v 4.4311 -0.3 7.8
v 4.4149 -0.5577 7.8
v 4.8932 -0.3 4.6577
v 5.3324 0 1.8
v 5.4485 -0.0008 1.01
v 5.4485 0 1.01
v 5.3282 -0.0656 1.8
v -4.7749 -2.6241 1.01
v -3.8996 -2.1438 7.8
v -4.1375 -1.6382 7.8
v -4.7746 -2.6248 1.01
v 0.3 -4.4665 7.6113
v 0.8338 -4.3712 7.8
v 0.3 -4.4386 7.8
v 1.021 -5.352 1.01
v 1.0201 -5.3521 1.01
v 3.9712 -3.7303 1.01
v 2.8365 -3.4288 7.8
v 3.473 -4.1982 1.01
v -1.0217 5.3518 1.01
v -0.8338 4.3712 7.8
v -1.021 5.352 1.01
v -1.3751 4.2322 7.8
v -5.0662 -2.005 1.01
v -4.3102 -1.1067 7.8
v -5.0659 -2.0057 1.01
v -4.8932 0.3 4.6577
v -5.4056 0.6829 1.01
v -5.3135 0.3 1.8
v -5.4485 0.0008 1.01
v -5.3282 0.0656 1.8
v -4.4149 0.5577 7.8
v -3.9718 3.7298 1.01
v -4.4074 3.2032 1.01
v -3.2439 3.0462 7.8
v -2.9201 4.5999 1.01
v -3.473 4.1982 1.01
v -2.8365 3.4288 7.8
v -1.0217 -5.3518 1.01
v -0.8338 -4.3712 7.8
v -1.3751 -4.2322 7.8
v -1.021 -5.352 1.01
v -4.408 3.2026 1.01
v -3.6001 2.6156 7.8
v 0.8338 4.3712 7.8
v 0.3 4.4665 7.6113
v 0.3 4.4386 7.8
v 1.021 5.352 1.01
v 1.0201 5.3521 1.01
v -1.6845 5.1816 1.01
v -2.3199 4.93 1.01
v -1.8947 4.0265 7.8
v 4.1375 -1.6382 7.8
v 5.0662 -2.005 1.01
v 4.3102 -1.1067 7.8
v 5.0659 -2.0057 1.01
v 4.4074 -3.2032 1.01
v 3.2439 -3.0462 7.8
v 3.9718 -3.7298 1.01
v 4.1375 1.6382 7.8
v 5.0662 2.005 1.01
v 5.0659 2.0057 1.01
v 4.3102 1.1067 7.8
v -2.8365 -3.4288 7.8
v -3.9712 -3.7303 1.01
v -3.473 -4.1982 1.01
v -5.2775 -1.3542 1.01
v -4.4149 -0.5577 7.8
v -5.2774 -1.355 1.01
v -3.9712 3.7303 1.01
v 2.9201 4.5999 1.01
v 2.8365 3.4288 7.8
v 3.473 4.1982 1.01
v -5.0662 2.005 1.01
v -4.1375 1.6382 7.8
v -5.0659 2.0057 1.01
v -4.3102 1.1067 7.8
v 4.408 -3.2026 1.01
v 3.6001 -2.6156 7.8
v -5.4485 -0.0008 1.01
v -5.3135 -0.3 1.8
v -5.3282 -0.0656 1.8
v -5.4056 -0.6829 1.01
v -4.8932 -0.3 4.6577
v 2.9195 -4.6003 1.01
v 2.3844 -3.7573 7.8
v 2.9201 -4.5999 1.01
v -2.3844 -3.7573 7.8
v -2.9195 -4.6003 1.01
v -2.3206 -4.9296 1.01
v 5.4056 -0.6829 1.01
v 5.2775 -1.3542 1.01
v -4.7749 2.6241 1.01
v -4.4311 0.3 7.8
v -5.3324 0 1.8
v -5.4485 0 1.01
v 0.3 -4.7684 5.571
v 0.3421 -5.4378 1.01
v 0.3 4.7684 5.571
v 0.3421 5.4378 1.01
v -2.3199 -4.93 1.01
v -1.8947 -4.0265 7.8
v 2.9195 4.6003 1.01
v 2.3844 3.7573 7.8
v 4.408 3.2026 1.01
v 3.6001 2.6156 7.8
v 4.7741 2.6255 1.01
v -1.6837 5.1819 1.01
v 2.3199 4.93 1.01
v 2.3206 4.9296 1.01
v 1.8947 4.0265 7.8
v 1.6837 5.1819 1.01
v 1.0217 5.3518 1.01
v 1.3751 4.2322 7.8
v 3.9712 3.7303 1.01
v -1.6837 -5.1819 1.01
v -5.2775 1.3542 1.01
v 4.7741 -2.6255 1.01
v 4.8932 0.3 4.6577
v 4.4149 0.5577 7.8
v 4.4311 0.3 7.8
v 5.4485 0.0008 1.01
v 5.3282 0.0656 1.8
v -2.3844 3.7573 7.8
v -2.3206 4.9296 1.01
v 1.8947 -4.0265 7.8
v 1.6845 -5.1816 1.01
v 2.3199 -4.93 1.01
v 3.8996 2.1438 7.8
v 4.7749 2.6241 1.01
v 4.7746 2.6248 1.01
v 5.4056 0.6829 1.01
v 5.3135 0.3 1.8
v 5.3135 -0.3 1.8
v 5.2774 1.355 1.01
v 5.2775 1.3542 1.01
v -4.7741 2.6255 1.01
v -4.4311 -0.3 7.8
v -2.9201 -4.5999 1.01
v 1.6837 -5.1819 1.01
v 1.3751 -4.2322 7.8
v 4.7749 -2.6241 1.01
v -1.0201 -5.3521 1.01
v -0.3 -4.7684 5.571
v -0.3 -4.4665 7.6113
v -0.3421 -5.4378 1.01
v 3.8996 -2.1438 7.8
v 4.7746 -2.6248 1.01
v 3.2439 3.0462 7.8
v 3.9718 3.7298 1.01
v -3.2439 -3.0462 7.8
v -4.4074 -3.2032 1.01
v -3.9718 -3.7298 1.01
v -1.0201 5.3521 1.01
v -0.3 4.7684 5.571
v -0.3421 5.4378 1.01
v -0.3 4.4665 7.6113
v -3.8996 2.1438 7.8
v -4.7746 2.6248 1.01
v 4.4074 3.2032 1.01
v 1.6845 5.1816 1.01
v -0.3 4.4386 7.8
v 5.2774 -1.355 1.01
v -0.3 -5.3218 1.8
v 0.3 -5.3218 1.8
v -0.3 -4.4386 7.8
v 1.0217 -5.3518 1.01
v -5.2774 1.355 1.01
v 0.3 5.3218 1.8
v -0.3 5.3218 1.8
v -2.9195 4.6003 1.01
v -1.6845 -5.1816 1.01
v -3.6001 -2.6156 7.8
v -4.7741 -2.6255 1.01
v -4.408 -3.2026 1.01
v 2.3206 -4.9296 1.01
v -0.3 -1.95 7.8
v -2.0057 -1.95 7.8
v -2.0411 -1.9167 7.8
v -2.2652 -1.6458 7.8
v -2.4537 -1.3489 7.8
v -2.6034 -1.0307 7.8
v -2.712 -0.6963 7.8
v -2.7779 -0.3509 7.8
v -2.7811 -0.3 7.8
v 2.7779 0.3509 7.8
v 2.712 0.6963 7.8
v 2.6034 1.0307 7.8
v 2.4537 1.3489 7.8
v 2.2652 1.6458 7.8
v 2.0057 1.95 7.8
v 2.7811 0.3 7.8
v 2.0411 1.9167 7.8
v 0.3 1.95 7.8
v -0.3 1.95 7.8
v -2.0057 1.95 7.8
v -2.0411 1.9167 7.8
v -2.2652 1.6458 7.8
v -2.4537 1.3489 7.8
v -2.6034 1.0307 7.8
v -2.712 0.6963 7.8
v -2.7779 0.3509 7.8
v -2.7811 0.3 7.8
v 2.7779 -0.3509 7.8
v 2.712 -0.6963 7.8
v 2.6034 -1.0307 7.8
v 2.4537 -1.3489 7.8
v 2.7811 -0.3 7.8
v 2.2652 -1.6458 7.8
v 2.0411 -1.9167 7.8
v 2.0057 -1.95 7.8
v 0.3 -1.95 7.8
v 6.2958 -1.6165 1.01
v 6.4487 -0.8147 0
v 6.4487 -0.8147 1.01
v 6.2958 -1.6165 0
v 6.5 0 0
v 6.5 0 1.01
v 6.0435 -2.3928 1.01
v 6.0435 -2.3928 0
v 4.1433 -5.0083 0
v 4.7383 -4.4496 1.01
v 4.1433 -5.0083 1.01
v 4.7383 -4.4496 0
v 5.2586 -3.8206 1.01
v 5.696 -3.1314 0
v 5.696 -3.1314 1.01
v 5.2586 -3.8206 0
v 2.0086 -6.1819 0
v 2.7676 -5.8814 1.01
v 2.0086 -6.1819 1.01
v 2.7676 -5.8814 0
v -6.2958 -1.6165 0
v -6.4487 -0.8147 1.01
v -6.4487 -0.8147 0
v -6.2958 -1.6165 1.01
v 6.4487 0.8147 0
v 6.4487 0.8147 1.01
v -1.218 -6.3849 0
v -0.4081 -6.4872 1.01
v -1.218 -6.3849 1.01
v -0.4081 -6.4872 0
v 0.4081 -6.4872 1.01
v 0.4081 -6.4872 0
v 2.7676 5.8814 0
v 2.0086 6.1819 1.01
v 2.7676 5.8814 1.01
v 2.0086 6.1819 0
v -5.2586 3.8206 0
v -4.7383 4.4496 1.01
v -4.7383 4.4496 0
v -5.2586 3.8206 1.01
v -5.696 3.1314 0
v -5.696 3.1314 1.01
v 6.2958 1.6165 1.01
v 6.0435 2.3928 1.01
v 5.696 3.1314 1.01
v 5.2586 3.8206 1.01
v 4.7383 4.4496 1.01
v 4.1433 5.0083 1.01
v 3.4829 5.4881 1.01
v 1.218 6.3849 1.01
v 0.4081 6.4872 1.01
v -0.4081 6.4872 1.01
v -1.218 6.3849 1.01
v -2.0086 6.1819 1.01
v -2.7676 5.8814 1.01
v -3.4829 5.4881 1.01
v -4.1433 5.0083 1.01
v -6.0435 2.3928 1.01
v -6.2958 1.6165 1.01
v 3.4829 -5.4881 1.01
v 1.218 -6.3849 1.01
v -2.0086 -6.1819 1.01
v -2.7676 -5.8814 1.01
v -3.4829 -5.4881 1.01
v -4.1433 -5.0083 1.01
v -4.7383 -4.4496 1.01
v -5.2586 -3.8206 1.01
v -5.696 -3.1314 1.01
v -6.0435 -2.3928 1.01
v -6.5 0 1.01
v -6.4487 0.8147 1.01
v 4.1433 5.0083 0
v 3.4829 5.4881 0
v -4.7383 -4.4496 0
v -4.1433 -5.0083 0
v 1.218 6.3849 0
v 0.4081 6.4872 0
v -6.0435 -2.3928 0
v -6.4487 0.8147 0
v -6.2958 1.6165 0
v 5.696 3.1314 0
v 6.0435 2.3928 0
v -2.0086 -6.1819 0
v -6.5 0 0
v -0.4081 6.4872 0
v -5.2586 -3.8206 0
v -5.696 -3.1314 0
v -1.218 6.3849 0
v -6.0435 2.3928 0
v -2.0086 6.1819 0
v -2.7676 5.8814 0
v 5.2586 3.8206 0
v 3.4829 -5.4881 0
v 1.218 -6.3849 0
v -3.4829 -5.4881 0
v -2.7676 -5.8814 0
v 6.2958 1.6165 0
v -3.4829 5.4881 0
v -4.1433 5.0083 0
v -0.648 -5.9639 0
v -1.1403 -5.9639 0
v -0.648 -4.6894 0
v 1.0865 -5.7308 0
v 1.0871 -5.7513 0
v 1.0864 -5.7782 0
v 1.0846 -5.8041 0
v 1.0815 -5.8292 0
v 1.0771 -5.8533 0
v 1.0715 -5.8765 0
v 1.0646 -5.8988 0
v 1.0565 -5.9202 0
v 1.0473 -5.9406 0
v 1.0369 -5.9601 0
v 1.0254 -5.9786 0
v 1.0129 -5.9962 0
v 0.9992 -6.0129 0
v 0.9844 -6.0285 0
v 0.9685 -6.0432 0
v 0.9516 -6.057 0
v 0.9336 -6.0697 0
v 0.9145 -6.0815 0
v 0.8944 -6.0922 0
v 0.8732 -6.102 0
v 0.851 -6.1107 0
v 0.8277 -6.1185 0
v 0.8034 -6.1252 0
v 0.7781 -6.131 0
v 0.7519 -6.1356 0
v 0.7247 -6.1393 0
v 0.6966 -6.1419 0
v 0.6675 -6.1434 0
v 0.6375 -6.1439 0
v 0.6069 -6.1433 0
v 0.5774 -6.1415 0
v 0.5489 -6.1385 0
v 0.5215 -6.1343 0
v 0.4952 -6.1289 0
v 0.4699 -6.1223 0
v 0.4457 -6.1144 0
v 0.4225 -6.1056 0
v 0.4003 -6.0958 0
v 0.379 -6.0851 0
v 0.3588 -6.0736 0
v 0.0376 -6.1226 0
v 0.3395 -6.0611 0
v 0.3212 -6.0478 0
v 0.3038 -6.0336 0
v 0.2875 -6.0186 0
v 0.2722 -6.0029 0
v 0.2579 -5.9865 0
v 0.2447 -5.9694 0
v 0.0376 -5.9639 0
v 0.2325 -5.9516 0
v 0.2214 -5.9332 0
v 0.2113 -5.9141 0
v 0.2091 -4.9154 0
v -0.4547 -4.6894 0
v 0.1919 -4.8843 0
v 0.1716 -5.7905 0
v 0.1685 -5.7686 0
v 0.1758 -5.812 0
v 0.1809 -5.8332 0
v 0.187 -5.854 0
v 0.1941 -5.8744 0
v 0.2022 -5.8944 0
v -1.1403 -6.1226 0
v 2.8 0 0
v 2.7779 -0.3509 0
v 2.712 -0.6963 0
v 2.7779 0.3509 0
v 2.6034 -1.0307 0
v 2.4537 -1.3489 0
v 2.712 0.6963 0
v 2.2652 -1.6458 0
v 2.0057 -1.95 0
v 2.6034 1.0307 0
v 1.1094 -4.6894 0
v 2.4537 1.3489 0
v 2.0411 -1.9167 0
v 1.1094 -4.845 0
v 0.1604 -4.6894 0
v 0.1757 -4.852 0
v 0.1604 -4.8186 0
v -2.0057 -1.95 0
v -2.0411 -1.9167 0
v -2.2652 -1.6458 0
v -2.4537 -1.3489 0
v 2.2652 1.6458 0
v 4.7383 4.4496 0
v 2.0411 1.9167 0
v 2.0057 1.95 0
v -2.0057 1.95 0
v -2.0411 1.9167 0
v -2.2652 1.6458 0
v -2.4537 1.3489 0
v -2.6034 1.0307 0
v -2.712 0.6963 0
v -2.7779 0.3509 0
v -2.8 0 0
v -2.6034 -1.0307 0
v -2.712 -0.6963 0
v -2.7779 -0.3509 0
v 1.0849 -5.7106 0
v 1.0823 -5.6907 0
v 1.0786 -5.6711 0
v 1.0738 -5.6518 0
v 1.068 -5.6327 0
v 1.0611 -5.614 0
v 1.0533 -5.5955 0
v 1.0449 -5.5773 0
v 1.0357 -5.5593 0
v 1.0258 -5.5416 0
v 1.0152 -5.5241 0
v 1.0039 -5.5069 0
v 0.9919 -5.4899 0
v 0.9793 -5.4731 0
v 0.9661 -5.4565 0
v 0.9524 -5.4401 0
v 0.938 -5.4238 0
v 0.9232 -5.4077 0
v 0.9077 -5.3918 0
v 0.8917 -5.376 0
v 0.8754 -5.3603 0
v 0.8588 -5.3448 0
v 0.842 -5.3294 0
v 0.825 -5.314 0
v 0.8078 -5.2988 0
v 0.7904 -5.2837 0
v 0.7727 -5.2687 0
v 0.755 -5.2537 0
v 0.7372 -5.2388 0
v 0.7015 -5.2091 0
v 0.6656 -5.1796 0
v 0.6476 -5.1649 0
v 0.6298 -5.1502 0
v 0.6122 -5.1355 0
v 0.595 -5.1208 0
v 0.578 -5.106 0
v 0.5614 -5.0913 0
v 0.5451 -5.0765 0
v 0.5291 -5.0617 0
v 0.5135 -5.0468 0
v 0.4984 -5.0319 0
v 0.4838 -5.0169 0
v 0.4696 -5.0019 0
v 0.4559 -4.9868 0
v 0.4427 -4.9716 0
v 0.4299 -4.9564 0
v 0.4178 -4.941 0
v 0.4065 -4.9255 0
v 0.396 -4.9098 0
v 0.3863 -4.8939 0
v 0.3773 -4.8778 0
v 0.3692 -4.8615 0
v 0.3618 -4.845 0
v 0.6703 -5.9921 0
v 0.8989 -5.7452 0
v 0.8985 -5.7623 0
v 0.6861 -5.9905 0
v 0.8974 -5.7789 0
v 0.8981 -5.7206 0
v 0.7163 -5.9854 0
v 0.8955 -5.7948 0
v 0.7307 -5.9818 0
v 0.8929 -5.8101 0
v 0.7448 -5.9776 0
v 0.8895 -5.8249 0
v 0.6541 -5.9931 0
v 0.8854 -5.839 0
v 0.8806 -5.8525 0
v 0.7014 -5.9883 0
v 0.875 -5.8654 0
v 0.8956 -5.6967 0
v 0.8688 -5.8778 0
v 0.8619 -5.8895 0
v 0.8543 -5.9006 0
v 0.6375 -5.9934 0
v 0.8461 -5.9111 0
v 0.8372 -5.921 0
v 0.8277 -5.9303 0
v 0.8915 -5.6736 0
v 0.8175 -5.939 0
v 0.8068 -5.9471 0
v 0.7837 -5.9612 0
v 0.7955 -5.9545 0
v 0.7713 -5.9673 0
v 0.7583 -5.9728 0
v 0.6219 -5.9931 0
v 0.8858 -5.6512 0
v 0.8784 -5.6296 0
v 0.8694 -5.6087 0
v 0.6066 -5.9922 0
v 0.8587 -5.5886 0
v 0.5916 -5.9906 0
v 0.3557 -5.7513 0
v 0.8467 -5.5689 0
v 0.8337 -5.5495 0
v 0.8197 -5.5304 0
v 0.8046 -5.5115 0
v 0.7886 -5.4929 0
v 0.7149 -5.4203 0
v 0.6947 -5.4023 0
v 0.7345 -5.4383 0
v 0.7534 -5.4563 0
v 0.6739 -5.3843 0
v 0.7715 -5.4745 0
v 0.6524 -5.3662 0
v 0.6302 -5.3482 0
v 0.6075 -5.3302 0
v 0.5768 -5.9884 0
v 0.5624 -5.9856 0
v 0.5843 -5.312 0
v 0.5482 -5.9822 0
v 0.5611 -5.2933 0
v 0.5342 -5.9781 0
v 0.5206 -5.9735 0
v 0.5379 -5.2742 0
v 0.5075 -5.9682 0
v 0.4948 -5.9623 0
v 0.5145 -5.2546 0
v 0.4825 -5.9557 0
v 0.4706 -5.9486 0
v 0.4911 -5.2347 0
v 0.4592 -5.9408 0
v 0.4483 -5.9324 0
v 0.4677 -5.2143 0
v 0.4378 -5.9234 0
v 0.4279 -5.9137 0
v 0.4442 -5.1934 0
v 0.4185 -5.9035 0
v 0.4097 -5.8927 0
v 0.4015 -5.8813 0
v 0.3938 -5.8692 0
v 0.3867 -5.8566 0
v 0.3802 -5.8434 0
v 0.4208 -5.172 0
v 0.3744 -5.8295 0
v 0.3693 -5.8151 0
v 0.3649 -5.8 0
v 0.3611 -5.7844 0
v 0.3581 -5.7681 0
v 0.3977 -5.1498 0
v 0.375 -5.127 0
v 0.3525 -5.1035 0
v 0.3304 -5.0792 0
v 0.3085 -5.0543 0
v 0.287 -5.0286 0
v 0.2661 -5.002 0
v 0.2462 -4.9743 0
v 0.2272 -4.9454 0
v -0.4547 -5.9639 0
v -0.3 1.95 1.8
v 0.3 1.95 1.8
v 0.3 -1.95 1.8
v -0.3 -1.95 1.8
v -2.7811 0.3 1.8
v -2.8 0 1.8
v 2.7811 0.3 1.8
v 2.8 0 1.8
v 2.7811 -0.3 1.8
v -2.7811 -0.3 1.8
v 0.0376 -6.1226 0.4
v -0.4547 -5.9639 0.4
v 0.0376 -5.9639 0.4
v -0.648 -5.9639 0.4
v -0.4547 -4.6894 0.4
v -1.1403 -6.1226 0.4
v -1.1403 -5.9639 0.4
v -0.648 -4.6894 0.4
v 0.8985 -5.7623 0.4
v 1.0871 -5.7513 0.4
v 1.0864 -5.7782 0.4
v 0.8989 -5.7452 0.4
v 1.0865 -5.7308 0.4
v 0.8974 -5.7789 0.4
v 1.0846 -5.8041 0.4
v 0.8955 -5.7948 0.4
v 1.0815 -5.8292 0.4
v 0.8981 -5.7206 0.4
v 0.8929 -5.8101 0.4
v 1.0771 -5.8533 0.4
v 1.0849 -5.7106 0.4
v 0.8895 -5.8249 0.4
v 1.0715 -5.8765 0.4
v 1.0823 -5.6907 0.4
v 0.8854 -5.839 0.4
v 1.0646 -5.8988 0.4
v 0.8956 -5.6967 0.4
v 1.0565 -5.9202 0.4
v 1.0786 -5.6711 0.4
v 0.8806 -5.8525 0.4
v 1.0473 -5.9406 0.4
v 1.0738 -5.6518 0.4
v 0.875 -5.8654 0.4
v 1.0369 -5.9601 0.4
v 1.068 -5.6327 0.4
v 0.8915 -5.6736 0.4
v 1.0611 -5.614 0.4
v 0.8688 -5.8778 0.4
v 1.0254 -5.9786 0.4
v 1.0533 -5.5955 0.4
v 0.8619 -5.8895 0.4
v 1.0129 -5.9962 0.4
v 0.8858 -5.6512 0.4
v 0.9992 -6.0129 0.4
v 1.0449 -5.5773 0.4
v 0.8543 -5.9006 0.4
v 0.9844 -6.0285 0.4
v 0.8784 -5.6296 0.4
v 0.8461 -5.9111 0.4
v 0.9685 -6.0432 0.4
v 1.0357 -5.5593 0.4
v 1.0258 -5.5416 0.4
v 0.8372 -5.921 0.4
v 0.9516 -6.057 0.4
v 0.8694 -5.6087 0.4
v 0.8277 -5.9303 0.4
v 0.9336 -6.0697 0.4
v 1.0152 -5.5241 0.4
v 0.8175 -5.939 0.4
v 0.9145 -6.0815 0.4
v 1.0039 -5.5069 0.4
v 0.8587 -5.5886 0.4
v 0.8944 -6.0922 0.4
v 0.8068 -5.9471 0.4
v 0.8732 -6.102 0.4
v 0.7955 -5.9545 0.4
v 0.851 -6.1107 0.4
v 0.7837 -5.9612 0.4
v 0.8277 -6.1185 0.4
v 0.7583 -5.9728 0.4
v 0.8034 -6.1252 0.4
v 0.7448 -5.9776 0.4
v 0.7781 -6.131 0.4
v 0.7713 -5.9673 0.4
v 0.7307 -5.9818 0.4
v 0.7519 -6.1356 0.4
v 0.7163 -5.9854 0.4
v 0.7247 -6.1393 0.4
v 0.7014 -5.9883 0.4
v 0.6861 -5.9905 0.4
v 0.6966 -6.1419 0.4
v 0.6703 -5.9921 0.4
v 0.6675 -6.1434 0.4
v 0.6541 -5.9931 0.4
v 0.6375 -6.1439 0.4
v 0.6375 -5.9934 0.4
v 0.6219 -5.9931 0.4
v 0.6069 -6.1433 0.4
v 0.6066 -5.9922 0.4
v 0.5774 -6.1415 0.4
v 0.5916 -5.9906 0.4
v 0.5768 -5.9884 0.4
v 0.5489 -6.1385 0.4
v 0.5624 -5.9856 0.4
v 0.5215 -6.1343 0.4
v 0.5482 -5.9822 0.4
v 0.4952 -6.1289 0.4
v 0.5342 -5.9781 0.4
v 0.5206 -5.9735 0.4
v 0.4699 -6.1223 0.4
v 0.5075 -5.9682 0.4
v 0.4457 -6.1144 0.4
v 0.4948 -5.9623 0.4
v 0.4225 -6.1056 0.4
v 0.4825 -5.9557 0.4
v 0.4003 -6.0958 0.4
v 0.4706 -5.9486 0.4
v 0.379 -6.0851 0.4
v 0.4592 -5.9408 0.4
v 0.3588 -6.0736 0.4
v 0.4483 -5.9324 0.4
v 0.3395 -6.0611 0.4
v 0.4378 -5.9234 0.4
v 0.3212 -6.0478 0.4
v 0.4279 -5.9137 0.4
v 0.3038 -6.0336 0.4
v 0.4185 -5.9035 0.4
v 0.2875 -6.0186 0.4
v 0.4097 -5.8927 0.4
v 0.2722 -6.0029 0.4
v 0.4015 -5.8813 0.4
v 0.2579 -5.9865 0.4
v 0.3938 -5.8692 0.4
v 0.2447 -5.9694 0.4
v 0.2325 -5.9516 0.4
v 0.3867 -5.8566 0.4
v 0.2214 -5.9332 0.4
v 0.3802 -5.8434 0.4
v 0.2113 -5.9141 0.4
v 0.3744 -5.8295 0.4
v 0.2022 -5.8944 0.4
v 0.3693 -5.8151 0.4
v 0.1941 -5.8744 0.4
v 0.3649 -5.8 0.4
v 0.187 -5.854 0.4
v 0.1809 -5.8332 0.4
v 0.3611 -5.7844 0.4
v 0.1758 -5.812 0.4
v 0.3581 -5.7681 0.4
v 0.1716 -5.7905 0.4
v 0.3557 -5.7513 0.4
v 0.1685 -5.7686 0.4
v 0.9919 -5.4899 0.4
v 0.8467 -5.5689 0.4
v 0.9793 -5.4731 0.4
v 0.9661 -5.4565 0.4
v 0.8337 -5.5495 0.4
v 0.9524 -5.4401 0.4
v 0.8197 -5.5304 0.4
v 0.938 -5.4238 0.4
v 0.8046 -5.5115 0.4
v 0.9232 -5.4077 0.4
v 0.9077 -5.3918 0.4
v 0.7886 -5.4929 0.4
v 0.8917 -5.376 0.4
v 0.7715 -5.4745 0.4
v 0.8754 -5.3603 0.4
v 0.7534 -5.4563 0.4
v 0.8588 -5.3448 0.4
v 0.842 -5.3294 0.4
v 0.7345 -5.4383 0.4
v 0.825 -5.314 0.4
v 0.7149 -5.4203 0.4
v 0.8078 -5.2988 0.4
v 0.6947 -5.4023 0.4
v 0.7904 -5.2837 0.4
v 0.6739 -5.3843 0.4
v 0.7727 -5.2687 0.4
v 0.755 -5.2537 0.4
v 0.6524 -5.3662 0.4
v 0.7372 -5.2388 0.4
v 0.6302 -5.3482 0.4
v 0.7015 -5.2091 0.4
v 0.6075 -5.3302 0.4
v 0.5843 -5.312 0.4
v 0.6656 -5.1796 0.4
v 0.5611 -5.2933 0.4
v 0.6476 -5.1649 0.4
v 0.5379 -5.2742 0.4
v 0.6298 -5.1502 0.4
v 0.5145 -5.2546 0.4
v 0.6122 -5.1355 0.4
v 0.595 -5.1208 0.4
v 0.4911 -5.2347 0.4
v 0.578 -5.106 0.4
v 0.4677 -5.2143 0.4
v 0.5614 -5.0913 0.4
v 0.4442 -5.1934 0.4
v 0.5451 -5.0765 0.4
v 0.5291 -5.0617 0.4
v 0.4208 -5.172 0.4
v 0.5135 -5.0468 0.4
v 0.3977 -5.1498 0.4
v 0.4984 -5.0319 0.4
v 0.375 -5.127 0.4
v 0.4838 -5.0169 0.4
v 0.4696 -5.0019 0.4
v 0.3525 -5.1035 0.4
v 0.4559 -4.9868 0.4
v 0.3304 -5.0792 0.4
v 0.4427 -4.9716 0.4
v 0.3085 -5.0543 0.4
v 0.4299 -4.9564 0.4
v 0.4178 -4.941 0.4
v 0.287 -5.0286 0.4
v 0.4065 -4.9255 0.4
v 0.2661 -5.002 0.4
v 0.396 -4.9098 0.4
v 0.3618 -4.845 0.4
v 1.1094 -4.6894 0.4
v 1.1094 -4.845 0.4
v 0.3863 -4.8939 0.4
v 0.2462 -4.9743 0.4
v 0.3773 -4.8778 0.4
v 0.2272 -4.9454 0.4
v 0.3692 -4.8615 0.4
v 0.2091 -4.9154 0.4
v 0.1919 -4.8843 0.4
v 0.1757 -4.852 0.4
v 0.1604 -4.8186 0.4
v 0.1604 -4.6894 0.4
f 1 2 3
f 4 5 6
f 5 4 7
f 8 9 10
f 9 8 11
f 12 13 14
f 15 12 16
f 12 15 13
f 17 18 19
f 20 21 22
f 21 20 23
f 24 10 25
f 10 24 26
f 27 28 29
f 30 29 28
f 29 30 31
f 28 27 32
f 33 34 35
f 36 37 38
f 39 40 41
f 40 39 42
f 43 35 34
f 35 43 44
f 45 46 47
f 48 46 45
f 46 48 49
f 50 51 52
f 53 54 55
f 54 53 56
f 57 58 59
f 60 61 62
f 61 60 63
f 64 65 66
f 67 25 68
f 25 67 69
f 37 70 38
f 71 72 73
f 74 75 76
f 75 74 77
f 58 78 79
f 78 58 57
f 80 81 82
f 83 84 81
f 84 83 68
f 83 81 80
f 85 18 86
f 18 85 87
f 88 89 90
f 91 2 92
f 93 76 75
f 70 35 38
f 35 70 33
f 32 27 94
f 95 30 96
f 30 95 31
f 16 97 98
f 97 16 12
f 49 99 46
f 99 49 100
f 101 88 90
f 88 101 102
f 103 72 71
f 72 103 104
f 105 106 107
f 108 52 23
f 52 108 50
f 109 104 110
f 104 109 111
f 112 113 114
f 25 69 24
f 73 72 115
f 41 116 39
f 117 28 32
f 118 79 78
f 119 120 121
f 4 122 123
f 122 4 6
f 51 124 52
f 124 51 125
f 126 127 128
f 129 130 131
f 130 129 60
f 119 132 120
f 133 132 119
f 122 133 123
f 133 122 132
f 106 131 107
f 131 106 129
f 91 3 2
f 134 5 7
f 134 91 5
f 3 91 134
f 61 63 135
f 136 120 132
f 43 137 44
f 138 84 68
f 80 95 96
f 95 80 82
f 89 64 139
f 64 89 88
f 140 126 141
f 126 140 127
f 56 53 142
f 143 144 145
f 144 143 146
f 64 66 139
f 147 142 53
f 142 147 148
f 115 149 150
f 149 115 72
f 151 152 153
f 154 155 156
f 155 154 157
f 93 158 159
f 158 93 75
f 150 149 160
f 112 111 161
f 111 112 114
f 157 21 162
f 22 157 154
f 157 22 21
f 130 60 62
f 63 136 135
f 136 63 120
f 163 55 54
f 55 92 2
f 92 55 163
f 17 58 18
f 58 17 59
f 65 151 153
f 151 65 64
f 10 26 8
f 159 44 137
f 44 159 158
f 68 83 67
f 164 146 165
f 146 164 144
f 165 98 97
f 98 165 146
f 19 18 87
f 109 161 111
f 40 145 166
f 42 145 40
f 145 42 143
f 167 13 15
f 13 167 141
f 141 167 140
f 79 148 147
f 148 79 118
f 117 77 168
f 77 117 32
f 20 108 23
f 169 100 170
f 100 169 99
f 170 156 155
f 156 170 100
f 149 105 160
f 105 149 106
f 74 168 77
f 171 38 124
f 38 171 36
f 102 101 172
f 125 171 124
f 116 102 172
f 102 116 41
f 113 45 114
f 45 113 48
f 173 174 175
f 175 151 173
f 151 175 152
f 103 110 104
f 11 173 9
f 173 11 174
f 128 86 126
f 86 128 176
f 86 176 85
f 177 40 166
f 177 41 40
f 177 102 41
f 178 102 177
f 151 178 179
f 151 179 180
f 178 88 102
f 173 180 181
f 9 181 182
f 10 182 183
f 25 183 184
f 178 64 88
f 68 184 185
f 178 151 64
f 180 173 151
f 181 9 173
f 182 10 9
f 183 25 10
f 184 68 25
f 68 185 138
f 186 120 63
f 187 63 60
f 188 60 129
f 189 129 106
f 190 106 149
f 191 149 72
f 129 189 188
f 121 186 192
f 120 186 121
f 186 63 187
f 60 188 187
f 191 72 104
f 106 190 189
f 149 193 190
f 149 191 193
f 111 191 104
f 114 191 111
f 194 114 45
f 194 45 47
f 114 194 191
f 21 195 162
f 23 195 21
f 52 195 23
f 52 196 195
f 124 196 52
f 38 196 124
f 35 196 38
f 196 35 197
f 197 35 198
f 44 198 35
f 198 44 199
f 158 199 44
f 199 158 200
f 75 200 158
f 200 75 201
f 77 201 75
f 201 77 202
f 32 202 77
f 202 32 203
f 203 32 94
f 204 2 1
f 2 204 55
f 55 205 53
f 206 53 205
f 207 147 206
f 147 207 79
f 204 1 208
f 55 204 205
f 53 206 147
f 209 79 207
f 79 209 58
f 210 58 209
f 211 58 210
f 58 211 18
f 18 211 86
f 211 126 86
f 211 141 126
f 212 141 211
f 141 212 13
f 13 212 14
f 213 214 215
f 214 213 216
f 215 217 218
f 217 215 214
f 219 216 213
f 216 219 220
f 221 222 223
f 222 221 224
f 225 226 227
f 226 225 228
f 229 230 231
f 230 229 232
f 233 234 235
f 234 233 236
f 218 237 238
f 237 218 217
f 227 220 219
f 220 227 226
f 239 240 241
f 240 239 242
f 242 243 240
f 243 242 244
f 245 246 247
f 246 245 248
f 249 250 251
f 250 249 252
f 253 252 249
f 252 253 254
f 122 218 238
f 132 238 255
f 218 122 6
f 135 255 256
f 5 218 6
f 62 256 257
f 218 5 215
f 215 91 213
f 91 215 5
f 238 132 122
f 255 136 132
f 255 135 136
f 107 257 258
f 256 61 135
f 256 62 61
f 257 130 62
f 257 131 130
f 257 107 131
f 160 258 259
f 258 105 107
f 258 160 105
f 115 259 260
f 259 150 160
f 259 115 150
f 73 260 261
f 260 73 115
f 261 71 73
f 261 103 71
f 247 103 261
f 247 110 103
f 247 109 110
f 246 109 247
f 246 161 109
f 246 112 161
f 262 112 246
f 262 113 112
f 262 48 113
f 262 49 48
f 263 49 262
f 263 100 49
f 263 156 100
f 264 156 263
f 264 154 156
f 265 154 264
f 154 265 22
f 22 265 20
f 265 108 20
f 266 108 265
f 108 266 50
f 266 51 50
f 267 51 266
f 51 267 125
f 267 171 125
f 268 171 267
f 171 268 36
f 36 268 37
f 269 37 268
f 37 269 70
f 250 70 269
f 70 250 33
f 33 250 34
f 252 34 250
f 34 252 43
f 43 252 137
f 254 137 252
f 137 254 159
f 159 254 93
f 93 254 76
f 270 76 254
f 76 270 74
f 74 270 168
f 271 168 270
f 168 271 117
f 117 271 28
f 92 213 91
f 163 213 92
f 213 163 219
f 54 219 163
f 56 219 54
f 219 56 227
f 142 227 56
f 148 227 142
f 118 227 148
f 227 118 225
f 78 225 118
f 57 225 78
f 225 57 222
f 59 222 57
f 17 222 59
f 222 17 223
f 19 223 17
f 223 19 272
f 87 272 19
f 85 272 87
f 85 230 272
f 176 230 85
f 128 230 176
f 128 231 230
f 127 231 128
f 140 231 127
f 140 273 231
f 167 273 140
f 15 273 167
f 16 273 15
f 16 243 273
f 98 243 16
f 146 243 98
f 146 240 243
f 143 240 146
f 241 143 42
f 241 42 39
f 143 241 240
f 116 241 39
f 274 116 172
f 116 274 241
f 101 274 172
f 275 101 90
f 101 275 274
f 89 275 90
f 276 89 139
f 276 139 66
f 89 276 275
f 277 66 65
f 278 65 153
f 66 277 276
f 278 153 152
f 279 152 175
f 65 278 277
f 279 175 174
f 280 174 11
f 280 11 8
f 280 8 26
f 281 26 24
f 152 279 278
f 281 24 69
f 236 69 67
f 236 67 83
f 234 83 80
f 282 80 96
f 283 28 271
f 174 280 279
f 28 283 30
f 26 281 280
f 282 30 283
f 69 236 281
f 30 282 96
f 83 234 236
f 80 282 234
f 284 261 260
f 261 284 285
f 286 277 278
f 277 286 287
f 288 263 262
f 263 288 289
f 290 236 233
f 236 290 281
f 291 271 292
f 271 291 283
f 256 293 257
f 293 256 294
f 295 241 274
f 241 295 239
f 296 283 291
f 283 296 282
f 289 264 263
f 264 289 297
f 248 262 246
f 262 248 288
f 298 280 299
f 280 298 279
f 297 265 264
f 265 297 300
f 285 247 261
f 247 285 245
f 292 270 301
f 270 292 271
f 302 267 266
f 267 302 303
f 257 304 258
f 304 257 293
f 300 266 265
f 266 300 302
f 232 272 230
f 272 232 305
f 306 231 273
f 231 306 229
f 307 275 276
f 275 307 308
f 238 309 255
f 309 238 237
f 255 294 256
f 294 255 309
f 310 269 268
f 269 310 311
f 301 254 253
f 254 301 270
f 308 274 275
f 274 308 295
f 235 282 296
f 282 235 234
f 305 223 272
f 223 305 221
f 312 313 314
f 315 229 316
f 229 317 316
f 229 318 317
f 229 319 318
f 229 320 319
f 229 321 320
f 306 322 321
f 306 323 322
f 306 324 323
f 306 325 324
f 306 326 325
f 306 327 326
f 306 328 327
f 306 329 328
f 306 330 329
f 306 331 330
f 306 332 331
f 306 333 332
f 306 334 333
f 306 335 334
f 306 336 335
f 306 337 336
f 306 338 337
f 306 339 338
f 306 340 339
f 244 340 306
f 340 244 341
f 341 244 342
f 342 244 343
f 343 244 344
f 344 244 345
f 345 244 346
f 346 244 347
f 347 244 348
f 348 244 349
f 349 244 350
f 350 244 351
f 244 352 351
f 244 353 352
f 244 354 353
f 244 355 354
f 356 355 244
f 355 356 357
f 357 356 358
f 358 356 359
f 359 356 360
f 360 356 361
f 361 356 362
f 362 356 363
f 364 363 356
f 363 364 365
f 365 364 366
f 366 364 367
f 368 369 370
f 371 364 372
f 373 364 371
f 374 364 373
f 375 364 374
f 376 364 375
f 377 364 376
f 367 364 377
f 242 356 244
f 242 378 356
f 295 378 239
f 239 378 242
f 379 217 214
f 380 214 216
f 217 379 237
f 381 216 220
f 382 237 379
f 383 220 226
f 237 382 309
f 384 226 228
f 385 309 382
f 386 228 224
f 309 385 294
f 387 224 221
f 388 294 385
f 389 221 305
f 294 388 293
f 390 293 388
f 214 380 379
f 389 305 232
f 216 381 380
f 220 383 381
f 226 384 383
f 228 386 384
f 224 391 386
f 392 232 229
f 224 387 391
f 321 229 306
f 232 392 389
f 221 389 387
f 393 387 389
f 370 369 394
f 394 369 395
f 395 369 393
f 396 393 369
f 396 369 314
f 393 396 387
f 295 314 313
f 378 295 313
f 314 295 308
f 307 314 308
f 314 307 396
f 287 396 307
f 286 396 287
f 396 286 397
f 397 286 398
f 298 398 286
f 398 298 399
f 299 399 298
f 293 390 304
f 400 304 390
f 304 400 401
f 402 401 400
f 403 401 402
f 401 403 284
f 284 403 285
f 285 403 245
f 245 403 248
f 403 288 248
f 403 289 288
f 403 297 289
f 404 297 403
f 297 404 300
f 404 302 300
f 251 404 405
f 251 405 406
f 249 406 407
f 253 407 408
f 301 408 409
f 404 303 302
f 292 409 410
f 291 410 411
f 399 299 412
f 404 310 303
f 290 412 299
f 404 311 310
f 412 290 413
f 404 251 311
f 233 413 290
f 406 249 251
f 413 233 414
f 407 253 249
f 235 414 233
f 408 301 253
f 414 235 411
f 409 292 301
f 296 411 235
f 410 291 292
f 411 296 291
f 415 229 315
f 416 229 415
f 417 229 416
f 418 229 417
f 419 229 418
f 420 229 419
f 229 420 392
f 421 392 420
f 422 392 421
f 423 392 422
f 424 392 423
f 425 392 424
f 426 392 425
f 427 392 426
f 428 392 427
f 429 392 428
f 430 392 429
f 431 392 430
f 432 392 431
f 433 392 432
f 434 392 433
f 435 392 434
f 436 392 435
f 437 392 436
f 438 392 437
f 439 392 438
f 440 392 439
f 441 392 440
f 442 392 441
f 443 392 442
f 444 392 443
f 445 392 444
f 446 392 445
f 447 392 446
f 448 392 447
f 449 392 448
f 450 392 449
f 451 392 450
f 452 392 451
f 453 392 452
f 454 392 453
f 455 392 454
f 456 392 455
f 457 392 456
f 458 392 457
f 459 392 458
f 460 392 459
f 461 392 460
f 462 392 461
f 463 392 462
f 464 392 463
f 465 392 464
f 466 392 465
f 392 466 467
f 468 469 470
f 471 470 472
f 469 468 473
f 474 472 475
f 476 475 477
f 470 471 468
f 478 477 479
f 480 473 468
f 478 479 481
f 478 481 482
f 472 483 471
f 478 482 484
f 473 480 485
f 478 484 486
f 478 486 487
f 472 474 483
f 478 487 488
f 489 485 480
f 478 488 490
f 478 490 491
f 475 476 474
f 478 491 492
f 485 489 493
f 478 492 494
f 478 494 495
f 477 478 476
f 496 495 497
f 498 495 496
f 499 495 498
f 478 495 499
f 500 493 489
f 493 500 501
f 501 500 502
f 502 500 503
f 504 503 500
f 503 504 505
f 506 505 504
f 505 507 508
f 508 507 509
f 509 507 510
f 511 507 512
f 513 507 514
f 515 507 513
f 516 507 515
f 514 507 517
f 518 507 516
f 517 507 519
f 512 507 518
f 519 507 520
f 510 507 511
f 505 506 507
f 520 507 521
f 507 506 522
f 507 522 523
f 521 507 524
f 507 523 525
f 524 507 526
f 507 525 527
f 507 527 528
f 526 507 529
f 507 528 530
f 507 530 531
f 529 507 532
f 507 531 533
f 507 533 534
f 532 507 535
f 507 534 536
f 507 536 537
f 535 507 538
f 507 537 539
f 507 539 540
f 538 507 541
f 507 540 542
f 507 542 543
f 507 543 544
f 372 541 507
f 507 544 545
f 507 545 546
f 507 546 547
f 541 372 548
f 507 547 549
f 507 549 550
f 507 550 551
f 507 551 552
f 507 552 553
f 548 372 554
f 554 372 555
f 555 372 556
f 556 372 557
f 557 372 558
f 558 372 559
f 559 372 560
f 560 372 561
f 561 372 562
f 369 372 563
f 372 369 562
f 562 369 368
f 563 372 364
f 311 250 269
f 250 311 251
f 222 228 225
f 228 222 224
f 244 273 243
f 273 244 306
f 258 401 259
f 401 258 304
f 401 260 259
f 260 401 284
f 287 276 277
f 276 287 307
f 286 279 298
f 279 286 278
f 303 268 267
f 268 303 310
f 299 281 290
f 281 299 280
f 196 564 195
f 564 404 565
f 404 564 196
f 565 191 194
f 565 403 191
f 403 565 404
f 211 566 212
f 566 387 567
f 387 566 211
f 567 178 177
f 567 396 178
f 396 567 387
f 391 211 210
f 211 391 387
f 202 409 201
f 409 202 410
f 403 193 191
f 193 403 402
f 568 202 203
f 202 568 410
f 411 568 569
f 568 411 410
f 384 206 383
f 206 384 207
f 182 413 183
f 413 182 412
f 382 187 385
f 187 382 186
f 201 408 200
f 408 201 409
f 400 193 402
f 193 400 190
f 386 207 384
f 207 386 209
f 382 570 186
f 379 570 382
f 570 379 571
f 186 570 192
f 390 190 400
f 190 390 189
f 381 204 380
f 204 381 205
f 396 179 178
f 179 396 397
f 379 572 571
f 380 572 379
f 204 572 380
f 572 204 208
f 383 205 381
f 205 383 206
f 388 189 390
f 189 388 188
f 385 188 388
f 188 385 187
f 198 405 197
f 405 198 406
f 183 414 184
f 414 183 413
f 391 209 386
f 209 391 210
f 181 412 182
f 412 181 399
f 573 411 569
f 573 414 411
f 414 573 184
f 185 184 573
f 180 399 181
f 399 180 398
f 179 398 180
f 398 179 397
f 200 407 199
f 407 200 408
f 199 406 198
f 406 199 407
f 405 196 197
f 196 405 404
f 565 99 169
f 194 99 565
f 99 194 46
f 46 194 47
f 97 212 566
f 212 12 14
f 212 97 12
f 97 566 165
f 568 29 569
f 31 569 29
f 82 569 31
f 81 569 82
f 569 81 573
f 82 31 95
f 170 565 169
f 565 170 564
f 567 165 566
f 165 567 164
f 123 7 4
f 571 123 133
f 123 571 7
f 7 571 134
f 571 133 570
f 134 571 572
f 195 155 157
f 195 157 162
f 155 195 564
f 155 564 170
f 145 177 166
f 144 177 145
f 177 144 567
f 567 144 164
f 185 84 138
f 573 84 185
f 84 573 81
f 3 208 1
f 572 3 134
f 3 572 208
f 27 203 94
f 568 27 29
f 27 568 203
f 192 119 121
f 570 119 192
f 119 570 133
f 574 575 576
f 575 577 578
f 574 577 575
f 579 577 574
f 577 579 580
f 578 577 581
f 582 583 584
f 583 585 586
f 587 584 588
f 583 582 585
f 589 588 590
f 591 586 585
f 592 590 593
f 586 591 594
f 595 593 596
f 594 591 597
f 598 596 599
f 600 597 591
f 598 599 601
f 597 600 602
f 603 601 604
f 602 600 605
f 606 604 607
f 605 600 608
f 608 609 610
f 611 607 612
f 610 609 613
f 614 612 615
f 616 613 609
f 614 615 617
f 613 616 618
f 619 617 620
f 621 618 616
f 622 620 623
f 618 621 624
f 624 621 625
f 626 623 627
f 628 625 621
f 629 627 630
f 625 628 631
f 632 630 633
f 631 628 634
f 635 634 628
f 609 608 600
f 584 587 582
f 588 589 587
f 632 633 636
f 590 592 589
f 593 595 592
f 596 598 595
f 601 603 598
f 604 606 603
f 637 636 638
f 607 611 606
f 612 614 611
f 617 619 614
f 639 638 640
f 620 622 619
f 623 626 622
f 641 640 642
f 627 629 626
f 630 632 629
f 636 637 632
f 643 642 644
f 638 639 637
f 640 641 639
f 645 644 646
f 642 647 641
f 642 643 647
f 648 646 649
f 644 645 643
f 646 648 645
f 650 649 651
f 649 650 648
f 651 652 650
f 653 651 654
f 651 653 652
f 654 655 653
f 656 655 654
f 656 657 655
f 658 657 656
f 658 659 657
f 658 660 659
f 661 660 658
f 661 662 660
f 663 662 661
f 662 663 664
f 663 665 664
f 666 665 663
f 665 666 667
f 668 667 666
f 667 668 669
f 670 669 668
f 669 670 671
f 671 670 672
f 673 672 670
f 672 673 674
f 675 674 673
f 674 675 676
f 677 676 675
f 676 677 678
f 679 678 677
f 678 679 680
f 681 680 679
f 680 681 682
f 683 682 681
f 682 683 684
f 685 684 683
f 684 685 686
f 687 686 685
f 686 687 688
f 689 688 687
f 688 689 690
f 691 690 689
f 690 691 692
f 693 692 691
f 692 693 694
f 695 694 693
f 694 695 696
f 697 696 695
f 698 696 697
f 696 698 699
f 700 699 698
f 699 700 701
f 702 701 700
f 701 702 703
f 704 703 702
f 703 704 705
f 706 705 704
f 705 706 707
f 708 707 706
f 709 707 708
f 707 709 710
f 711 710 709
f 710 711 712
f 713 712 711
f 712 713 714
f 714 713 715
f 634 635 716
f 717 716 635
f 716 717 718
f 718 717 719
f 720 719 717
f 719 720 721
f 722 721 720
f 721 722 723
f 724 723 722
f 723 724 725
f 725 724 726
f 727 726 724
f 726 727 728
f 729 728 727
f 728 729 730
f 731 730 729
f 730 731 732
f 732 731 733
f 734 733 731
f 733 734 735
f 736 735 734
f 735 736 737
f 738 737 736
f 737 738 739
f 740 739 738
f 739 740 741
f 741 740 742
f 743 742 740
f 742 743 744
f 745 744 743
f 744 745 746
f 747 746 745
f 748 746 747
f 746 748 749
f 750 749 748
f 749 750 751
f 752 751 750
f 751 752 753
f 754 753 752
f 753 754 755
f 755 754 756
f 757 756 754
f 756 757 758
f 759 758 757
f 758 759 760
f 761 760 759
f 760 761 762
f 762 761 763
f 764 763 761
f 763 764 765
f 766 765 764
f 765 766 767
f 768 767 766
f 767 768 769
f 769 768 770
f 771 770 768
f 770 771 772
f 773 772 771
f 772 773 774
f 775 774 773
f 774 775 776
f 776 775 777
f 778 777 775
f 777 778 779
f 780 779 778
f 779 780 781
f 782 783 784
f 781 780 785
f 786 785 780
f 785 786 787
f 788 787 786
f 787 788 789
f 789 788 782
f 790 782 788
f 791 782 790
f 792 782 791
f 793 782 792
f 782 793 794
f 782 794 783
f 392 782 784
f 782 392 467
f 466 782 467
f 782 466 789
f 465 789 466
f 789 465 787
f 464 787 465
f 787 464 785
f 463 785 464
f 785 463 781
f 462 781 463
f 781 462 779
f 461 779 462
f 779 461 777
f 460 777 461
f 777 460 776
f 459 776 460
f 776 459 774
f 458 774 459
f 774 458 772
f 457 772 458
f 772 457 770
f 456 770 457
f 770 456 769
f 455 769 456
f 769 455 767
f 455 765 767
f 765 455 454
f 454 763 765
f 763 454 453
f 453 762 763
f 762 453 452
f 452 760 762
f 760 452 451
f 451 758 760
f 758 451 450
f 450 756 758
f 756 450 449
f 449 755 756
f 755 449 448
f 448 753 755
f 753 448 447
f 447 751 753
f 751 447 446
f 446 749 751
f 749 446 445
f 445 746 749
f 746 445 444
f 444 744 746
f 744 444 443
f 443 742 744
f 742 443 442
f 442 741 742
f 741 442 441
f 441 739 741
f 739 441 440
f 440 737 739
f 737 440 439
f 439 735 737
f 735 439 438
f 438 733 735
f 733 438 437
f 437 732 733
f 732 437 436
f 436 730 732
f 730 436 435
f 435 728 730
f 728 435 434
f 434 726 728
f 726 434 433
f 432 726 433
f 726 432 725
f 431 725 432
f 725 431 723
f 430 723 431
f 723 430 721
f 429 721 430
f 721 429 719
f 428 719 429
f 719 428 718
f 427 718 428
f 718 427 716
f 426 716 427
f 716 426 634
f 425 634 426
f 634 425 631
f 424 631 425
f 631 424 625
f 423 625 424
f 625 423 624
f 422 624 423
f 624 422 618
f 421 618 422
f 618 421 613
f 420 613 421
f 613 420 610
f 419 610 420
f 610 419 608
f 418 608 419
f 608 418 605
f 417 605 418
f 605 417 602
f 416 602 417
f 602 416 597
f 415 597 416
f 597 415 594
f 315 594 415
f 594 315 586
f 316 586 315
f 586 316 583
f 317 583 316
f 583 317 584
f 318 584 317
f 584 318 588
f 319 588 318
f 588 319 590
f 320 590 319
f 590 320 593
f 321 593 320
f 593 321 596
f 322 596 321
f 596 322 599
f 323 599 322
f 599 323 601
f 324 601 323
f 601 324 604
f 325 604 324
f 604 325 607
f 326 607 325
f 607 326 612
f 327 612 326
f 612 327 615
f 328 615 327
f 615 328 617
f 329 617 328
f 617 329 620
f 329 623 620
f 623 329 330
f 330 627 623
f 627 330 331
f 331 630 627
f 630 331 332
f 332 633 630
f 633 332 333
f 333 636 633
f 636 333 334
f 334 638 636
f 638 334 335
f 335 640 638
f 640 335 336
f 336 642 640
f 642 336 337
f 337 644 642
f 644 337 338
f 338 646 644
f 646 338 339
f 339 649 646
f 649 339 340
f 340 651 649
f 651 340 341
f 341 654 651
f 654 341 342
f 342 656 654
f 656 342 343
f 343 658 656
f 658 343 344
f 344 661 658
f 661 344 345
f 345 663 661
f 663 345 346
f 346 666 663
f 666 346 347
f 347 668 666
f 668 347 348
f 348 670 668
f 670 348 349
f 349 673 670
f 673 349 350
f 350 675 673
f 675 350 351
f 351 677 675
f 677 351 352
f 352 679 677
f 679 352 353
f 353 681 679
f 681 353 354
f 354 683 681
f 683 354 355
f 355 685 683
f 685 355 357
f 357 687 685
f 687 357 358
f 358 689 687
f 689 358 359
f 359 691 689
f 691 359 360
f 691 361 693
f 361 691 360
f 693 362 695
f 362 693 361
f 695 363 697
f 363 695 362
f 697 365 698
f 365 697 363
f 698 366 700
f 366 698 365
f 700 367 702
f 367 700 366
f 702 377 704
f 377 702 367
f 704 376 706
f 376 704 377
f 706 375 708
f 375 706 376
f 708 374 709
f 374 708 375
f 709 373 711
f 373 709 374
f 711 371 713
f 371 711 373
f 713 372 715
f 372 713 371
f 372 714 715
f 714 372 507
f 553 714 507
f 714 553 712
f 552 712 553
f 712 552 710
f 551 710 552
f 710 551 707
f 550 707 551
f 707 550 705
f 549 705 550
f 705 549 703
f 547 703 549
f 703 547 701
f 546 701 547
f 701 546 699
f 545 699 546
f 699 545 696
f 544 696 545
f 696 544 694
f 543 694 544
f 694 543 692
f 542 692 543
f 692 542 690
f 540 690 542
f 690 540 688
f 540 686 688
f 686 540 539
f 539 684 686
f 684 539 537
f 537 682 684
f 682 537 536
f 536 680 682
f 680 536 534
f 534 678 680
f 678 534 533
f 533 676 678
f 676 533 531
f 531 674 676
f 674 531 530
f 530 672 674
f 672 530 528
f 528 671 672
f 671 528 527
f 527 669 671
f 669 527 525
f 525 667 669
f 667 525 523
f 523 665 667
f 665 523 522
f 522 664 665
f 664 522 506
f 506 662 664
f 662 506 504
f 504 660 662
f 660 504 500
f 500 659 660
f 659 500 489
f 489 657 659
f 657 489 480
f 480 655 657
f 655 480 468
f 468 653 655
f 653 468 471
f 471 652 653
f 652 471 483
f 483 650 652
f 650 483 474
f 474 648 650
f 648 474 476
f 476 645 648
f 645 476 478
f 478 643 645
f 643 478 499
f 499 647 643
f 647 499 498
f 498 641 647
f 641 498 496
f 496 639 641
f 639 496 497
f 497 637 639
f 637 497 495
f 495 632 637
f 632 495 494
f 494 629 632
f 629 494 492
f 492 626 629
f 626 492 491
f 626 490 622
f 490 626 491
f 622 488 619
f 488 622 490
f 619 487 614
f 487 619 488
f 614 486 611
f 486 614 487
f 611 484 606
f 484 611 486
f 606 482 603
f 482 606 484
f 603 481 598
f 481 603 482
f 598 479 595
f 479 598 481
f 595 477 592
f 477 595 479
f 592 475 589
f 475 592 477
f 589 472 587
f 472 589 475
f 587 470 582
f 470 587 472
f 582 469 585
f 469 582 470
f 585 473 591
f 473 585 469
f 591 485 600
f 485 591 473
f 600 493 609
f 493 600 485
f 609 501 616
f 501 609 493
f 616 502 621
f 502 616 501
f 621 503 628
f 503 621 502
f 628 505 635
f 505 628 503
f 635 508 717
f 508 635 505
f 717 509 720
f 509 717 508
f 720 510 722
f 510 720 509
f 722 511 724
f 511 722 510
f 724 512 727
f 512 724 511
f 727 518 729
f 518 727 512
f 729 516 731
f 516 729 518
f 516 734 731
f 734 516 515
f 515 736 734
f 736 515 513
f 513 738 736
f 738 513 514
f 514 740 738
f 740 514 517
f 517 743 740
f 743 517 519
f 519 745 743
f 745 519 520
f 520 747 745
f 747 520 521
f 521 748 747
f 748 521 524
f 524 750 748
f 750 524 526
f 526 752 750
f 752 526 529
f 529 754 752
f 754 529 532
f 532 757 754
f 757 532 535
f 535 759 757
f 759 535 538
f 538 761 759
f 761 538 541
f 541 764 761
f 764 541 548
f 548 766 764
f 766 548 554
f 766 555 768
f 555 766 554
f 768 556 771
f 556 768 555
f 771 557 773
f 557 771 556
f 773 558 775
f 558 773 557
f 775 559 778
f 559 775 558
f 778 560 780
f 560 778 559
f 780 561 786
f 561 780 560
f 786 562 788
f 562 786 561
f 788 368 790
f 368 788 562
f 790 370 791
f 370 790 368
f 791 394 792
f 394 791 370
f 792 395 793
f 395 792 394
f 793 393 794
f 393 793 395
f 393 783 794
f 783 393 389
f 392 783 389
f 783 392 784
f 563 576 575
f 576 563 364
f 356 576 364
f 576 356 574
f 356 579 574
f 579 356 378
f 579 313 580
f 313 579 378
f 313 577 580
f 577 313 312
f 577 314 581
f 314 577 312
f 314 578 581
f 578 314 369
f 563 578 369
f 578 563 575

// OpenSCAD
$fn = 50;

difference() {
	union() {
		translate(v = [0, 0, 11.5]) {
			rotate(a = [180, 0, 0]) {
				difference() {
					union() {
						translate(v = [0, 0, 3.7]) {
							cylinder(h = 6.8, r1 = 4.45, r2 = 5.45);
						}
						translate(v = [0, 0, 10.49]) {
							cylinder(h = 1.01, r = 6.5);
						}
					}
					union() {
						translate(v = [0, 0, 0]) {
							rotate(a = [0, 0, 0]) {
								difference() {
									union() {
										translate(v = [0, 0, 3.6]) {
											cylinder(h = 8.0, r = 2.8000000000000003);
										}
									}
									union() {
										translate(v = [-20.0, -21.95, 2.6]) {
											cube(size = [40, 20, 10.0]);
										}
										translate(v = [-20.0, 1.9499999999999993, 2.6]) {
											cube(size = [40, 20, 10.0]);
										}
									}
								}
							}
						}
						translate(v = [-0.3, -10.0, 3.6]) {
							cube(size = [0.6, 20, 6.1]);
						}
						translate(v = [-10.0, -0.3, 3.6]) {
							cube(size = [20, 0.6, 6.1]);
						}
						translate(v = [0, 5.4, 11.1]) {
							linear_extrude(height = 0.45) {
								text(font = "Liberation Sans", halign = "center", size = 1.5, text = "T2", valign = "center");
							}
						}
					}
				}
			}
		}
	}
	union();
}
